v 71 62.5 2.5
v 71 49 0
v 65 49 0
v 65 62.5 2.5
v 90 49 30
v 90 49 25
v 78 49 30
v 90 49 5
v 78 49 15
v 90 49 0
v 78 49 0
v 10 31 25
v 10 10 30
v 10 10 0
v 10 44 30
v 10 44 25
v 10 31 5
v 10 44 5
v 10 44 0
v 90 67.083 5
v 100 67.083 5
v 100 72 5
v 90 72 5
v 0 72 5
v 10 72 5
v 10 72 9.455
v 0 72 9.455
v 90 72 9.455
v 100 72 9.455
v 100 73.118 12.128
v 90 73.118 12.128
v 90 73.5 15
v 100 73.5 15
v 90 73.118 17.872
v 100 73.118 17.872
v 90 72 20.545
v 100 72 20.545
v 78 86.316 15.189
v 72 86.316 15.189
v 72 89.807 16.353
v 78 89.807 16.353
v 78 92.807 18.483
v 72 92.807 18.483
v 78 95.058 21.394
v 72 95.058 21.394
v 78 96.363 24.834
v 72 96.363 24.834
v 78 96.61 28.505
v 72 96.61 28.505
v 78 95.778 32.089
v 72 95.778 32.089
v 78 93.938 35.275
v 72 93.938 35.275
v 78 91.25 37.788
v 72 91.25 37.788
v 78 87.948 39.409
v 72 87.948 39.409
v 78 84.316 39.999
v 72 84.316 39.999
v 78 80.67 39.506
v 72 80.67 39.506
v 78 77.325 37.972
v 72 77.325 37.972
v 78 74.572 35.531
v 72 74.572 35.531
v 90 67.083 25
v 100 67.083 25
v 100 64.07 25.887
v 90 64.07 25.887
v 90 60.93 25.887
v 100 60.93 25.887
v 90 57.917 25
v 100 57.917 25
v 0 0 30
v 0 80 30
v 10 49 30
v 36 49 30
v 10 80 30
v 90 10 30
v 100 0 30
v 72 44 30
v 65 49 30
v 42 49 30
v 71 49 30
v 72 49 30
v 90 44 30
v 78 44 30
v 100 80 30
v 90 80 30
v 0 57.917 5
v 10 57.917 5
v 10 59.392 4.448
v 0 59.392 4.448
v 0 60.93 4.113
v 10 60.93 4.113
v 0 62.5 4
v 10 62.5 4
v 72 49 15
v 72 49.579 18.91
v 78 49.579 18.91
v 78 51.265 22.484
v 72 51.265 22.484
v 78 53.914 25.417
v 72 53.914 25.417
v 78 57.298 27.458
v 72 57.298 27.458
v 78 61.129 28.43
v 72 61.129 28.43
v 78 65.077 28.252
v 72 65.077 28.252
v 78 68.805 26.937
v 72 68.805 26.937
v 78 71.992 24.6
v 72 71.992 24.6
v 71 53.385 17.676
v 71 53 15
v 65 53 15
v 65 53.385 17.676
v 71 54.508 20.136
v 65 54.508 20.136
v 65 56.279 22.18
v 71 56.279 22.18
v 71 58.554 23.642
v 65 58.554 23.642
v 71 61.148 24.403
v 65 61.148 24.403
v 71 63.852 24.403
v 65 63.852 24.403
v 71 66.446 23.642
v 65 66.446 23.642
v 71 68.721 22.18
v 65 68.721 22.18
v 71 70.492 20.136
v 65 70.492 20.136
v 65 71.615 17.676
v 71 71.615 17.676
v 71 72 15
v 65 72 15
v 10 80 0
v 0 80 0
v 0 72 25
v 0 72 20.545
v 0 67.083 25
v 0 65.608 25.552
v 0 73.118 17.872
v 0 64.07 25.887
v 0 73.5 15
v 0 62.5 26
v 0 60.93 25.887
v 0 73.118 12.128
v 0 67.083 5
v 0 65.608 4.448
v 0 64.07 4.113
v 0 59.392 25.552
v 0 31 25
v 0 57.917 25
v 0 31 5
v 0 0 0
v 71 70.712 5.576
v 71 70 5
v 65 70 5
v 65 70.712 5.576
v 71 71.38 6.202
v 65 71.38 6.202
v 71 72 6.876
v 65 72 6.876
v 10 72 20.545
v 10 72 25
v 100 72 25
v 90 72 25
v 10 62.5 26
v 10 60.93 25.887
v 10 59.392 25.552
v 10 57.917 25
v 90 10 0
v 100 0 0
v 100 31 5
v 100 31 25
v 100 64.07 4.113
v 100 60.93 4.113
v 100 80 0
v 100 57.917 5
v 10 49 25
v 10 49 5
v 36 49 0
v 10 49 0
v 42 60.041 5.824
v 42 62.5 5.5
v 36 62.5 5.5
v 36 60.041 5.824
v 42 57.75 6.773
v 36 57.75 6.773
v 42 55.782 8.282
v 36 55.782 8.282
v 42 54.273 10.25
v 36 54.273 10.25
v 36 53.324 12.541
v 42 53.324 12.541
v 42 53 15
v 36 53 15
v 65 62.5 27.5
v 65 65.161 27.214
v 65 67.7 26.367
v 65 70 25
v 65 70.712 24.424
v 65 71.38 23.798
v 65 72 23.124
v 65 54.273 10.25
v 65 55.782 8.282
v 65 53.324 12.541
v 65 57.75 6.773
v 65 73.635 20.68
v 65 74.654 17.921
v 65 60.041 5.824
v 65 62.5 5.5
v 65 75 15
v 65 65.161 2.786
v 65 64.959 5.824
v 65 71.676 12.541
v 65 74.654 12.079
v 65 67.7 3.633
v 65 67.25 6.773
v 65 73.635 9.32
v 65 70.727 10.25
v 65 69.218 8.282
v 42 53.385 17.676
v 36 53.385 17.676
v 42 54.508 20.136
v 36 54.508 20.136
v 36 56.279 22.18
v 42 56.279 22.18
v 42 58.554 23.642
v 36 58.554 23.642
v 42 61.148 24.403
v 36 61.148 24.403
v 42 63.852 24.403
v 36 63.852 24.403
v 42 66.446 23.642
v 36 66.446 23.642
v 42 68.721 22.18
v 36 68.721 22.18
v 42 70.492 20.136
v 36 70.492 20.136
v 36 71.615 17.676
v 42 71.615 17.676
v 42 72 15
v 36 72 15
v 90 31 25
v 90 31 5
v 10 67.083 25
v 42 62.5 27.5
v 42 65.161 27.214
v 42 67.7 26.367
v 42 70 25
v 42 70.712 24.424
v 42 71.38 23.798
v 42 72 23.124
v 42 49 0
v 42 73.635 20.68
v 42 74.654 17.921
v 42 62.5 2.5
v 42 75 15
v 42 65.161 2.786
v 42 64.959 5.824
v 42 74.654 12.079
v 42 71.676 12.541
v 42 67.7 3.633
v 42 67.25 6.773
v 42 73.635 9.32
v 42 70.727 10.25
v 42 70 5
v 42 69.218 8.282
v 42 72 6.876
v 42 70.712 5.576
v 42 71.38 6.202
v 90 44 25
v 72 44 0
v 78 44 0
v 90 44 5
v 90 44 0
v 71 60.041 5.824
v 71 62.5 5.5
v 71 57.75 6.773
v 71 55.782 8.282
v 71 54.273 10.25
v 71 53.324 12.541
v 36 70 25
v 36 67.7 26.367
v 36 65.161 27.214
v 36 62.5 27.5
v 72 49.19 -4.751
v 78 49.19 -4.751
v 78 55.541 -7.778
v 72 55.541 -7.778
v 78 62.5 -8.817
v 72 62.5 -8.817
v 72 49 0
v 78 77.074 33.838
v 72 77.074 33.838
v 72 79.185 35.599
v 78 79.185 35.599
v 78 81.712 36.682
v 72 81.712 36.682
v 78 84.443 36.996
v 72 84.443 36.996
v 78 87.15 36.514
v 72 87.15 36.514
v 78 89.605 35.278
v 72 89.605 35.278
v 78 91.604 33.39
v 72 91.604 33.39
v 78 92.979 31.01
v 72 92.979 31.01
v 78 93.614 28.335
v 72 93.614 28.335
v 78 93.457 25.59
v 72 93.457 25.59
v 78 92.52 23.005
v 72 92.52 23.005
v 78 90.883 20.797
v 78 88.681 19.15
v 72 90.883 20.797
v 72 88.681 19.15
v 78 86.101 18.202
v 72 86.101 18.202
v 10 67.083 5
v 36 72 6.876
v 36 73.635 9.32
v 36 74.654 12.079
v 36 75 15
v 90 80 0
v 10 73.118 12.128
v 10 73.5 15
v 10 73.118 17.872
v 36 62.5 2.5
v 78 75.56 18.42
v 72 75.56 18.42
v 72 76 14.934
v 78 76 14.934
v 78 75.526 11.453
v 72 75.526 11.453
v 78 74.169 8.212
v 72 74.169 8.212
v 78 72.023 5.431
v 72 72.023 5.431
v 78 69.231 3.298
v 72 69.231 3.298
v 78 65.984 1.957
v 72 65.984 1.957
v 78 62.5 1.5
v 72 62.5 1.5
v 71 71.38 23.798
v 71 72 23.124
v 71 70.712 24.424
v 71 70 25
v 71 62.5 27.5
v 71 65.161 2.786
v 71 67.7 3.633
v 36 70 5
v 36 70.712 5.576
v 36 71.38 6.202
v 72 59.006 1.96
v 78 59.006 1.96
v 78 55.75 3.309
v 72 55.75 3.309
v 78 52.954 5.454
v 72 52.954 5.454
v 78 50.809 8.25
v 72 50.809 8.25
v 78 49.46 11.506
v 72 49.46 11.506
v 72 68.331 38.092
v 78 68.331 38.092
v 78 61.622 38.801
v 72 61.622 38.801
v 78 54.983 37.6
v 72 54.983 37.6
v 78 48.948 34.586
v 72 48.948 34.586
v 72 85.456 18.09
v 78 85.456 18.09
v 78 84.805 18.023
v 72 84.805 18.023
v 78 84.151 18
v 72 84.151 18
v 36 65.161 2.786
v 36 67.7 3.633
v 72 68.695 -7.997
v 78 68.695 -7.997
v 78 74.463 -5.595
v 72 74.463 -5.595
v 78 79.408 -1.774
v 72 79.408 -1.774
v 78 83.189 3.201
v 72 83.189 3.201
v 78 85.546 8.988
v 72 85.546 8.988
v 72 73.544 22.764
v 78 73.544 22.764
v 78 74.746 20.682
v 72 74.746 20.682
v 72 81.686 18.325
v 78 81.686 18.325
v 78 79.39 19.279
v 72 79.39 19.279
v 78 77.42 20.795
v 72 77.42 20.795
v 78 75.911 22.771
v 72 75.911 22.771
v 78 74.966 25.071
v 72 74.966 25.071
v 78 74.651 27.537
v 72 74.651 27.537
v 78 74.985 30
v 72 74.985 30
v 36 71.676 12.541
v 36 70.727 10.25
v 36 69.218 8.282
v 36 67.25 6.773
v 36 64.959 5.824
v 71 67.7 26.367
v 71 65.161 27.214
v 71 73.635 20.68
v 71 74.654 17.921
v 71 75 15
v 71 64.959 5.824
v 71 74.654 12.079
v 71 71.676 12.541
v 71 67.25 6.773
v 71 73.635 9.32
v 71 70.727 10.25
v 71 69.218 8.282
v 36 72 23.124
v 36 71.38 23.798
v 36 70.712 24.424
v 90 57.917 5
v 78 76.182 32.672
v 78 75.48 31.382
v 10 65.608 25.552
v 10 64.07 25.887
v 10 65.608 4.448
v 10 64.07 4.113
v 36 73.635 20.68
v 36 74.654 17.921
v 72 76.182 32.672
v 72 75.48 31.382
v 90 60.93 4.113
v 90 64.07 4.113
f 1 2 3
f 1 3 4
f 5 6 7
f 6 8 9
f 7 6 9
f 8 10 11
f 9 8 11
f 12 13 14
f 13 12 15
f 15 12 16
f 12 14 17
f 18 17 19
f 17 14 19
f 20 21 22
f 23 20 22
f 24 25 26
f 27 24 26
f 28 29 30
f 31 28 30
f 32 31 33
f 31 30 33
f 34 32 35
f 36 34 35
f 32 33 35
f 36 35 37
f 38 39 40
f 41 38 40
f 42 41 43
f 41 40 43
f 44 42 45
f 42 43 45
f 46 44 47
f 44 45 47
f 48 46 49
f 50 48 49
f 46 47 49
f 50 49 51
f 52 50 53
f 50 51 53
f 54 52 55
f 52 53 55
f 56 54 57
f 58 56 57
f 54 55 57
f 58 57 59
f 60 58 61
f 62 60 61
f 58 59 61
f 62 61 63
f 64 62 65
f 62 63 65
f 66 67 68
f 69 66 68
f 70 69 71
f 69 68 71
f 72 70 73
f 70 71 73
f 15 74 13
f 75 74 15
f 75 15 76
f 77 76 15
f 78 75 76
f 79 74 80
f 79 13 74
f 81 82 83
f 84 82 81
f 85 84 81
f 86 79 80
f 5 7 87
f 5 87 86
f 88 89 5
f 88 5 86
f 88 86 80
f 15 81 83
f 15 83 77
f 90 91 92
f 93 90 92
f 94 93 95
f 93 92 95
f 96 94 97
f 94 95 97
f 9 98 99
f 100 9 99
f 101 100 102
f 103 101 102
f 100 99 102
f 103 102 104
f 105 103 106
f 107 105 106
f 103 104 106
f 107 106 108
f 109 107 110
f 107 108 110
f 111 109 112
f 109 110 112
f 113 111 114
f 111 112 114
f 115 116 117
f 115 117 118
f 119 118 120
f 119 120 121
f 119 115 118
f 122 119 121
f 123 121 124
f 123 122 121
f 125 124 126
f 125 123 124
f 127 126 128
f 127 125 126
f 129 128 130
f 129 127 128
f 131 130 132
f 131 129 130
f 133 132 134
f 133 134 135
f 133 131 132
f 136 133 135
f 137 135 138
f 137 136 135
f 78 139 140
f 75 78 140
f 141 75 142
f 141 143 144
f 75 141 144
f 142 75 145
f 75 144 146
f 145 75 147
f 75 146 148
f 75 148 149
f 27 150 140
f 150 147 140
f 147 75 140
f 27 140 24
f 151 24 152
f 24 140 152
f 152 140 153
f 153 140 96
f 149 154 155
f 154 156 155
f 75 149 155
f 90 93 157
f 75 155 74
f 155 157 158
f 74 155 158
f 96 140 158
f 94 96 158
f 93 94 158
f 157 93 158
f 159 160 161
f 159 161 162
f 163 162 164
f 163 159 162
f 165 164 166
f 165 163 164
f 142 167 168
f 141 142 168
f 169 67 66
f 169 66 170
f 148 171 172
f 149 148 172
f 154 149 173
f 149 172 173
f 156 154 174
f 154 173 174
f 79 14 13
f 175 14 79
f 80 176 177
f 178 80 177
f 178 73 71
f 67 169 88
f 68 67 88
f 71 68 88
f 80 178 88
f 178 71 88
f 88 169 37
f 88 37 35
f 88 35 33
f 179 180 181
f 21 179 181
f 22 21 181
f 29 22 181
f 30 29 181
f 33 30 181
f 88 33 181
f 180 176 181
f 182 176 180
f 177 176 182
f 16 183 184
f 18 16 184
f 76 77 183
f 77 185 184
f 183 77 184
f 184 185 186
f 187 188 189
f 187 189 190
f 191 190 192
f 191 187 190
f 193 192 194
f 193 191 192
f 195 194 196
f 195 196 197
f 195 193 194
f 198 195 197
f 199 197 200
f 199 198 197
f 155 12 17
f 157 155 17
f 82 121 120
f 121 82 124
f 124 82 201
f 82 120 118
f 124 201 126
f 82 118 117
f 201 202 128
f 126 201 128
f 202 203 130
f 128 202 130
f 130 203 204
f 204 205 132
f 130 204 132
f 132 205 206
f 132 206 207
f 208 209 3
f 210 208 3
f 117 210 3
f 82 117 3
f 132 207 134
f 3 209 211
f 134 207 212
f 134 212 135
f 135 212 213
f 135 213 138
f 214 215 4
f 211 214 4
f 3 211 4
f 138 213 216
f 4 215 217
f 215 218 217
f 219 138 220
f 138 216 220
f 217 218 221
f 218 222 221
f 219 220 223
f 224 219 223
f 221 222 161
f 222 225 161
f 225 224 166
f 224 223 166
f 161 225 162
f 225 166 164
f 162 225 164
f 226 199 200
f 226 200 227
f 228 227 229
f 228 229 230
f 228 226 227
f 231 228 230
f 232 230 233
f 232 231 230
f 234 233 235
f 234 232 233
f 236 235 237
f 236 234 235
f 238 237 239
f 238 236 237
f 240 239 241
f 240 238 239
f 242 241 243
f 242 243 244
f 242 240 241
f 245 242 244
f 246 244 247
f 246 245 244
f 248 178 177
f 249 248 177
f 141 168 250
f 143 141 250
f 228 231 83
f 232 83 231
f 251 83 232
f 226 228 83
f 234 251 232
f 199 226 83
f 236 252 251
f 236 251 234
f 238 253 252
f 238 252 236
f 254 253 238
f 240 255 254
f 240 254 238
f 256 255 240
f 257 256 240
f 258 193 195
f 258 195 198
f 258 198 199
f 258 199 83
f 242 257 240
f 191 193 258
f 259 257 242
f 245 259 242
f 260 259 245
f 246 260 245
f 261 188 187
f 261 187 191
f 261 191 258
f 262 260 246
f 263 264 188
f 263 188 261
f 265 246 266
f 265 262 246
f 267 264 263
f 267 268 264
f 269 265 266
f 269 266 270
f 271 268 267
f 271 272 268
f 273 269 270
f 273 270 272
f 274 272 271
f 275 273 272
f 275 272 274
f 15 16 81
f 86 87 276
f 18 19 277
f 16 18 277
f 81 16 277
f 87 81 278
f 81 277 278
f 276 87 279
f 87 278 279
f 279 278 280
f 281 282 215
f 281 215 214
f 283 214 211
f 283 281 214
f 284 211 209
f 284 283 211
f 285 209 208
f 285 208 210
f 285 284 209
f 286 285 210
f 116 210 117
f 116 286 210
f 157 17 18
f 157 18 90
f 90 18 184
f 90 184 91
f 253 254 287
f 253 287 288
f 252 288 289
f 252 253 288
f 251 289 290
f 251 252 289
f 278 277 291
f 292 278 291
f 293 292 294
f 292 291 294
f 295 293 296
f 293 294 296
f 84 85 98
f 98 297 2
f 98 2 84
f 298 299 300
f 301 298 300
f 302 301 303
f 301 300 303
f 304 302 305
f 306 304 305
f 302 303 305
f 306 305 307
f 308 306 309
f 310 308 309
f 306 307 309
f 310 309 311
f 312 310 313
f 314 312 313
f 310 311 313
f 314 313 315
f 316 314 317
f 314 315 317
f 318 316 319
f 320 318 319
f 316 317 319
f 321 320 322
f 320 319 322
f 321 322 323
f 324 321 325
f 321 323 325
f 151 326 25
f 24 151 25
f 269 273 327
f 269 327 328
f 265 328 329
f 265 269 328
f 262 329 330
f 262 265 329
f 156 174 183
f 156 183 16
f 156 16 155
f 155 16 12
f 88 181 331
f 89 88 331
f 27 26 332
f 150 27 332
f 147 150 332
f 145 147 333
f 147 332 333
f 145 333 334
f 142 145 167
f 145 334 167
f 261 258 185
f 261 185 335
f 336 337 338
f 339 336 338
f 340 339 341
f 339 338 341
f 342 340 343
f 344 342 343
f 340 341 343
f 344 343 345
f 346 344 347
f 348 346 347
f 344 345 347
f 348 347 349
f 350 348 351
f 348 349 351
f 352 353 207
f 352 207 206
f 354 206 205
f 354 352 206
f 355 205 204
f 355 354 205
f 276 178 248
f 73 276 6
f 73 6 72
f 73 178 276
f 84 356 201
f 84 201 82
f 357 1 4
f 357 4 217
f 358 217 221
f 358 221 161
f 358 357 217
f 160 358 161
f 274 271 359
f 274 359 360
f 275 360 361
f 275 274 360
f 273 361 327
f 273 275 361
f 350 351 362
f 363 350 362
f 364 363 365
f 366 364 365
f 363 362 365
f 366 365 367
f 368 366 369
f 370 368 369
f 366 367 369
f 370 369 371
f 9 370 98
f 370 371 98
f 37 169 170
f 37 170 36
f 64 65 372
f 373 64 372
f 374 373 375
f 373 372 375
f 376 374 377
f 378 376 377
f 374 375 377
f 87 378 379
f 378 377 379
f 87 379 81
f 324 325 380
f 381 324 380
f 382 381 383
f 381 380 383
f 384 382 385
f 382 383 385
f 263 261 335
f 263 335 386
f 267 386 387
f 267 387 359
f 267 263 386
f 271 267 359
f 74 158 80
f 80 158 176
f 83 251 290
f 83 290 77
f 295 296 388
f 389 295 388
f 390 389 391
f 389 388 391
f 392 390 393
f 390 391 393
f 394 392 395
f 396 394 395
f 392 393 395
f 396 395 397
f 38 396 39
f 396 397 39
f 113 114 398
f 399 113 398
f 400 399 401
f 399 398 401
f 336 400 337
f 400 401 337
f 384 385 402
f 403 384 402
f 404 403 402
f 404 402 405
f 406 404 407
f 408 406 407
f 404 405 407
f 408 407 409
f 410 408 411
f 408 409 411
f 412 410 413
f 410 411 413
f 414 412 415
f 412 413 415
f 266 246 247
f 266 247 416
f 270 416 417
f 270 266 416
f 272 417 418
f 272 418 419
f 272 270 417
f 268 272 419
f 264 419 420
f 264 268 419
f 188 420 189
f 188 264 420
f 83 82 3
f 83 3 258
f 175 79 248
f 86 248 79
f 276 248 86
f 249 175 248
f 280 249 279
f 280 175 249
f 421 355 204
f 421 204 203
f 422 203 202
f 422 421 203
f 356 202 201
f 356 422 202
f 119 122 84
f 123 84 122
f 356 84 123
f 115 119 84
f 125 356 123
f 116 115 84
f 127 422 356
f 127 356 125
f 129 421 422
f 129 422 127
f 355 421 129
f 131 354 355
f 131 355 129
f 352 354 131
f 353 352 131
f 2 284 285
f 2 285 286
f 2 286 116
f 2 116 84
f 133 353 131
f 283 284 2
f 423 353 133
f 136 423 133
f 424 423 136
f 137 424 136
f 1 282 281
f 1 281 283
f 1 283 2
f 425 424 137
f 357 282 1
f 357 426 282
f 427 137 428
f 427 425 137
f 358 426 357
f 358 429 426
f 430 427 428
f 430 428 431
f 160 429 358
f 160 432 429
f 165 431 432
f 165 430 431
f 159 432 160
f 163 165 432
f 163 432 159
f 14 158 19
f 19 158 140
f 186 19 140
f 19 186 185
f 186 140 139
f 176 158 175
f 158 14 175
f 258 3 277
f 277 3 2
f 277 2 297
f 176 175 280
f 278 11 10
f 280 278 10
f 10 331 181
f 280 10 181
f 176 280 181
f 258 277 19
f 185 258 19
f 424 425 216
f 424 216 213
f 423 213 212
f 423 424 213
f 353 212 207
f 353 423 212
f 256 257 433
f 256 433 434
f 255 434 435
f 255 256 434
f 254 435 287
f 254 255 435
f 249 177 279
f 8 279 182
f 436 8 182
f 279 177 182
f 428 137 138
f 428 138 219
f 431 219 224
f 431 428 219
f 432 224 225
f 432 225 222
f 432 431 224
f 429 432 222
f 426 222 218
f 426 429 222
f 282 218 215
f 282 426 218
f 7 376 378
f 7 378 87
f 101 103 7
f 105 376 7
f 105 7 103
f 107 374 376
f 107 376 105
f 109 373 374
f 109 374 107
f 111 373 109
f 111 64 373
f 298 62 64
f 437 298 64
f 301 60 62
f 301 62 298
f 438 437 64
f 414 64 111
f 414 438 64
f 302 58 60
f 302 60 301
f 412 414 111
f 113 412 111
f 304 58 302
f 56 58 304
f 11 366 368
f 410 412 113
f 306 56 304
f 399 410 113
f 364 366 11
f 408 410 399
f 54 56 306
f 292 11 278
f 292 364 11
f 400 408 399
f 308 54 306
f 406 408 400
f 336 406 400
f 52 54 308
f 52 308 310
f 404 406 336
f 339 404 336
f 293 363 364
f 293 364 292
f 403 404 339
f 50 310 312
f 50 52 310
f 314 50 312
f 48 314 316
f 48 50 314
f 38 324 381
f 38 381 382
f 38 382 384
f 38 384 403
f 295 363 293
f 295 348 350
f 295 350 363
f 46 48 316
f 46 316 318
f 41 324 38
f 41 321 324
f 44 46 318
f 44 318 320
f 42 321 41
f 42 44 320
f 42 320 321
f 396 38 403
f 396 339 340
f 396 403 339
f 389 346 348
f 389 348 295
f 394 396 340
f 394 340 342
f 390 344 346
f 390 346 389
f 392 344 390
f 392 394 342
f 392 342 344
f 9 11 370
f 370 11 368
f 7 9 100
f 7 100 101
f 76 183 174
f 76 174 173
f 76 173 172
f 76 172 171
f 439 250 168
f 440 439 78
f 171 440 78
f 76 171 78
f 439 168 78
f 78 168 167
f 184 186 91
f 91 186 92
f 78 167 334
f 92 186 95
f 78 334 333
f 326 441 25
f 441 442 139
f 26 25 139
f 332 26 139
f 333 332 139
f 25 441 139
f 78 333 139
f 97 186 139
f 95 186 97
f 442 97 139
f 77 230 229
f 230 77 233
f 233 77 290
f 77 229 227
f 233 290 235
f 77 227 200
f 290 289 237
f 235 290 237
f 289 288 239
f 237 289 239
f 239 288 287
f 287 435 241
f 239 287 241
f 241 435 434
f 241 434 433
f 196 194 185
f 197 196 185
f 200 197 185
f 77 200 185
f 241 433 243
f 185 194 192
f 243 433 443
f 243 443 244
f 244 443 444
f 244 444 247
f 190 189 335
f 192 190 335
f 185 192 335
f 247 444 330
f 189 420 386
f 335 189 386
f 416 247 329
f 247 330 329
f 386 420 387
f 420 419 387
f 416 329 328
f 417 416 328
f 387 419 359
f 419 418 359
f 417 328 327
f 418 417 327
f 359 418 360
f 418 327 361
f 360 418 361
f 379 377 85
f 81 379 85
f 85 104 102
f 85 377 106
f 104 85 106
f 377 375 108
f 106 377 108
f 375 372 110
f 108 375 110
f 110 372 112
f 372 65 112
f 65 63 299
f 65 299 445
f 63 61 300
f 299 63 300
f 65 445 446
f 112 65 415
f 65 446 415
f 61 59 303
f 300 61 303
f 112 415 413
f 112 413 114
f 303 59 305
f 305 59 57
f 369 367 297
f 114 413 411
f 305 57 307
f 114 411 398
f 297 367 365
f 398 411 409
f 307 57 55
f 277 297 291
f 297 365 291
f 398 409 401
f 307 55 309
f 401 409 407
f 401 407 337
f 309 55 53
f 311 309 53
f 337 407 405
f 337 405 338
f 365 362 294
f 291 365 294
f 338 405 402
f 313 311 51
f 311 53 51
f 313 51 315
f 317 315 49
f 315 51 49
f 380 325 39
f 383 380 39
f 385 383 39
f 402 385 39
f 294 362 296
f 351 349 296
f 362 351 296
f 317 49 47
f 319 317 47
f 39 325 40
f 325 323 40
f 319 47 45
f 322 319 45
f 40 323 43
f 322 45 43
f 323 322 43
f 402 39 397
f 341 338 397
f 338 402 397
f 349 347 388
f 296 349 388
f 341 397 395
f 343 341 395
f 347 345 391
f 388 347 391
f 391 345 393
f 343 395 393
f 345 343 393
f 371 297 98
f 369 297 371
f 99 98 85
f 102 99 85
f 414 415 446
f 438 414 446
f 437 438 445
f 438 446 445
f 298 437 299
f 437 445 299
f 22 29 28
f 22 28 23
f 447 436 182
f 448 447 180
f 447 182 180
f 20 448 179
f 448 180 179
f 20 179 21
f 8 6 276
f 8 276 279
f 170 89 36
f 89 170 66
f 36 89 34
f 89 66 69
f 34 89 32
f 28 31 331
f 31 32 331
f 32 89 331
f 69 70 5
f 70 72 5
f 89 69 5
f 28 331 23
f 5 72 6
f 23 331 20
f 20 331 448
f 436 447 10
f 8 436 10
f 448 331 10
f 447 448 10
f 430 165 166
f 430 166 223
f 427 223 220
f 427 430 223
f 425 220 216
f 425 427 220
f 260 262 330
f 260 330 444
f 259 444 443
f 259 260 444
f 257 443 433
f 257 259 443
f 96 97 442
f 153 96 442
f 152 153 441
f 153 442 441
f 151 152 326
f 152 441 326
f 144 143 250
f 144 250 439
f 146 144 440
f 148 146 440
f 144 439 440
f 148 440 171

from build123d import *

# Parameters (mm, degrees)
CROQUIS1_W              = 80
CROQUIS1_H              = 34
SALIENTE_EXTRUIR1_DEPTH = 30
CROQUIS2_W              = 20
CROQUIS2_H              = 18
CORTAR_EXTRUIR1_DEPTH   = 30
CORTAR_EXTRUIR2_START   = 100
CROQUIS2_4_R            = 11
CROQUIS2_4_W            = 20
CROQUIS2_4_H            = 41
CORTAR_EXTRUIR2_DEPTH   = 20
SALIENTE_EXTRUIR2_START = 32
SALIENTE_EXTRUIR2_DEPTH = 6
SALIENTE_EXTRUIR3_START = 61
SALIENTE_EXTRUIR3_DEPTH = 6
SALIENTE_EXTRUIR4_START = -28
SALIENTE_EXTRUIR4_DEPTH = 6


# Read off the part's stored shape, not the designer's step: Saliente-Extruir4
with BuildPart() as part:
    # Croquis1 → Saliente-Extruir1 (new body)
    with BuildSketch(Plane.XY):
        Polygon((0, 80), (0, 0), (100, 0), (100, 80), (90, 80), (90, 49), (10, 49), (10, 80), align=None)
        with Locations((50, 27)):
            Rectangle(CROQUIS1_W, CROQUIS1_H, mode=Mode.SUBTRACT)
    extrude(amount=SALIENTE_EXTRUIR1_DEPTH)

    # Croquis2 → Cortar-Extruir1 (cut)
    with BuildSketch(Plane(origin=(10, 0, 0), x_dir=(0, 0, -1), z_dir=(1, 0, 0))):
        with BuildLine():
            Line((-20.545268253, 72), (-25, 72))
            Line((-25, 72), (-25, 67.082575695))
            ThreePointArc((-25, 67.082575695), (-23.152245501, 69.885180654), (-20.545268253, 72))
        make_face()
        with BuildLine():
            ThreePointArc((-9.454731747, 72), (-15, 73.5), (-20.545268253, 72))
            Line((-20.545268253, 72), (-9.454731747, 72))
        make_face()
        with BuildLine():
            Line((-5, 72), (-9.454731747, 72))
            ThreePointArc((-9.454731747, 72), (-6.847754499, 69.885180654), (-5, 67.082575695))
            Line((-5, 67.082575695), (-5, 72))
        make_face()
        with BuildLine():
            ThreePointArc((-4, 62.5), (-4.25290737, 64.84520788), (-5, 67.082575695))
            Line((-5, 67.082575695), (-5, 62.5))
            Line((-5, 62.5), (-4, 62.5))
        make_face()
        with BuildLine():
            Line((-4, 62.5), (-5, 62.5))
            Line((-5, 62.5), (-5, 57.917424305))
            ThreePointArc((-5, 57.917424305), (-4.25290737, 60.15479212), (-4, 62.5))
        make_face()
        with BuildLine():
            Line((-25, 62.5), (-25, 67.082575695))
            ThreePointArc((-25, 67.082575695), (-25.74709263, 64.84520788), (-26, 62.5))
            Line((-26, 62.5), (-25, 62.5))
        make_face()
        with BuildLine():
            Line((-25, 57.917424305), (-25, 62.5))
            Line((-25, 62.5), (-26, 62.5))
            ThreePointArc((-26, 62.5), (-25.74709263, 60.15479212), (-25, 57.917424305))
        make_face()
        with BuildLine():
            Line((-9.454731747, 72), (-20.545268253, 72))
            ThreePointArc((-20.545268253, 72), (-23.152245501, 69.885180654), (-25, 67.082575695))
            Line((-25, 67.082575695), (-25, 62.5))
            Line((-25, 62.5), (-5, 62.5))
            Line((-5, 62.5), (-5, 67.082575695))
            ThreePointArc((-5, 67.082575695), (-6.847754499, 69.885180654), (-9.454731747, 72))
        make_face()
        with BuildLine():
            Line((-5, 62.5), (-25, 62.5))
            Line((-25, 62.5), (-25, 57.917424305))
            ThreePointArc((-25, 57.917424305), (-15, 51.5), (-5, 57.917424305))
            Line((-5, 57.917424305), (-5, 62.5))
        make_face()
        with BuildLine():
            ThreePointArc((-5, 57.917424305), (-15, 51.5), (-25, 57.917424305))
            Line((-25, 57.917424305), (-25, 49))
            Line((-25, 49), (-5, 49))
            Line((-5, 49), (-5, 57.917424305))
        make_face()
        with Locations((-15, 40)):
            Rectangle(CROQUIS2_W, CROQUIS2_H)
    extrude(amount=-CORTAR_EXTRUIR1_DEPTH, mode=Mode.SUBTRACT)

    # Croquis2<4> → Cortar-Extruir2 (cut)
    with BuildSketch(Plane(origin=(10, 0, 0), x_dir=(0, 0, -1), z_dir=(1, 0, 0)).offset(CORTAR_EXTRUIR2_START)):
        with Locations((-15, 62.5)):
            Circle(CROQUIS2_4_R)
        with Locations((-15, 51.5)):
            Rectangle(CROQUIS2_4_W, CROQUIS2_4_H)
    extrude(amount=-CORTAR_EXTRUIR2_DEPTH, mode=Mode.SUBTRACT)

    # Croquis3 → Saliente-Extruir2 (add)
    with BuildSketch(Plane(origin=(10, 0, 0), x_dir=(0, 0, -1), z_dir=(1, 0, 0)).offset(SALIENTE_EXTRUIR2_START)):
        with BuildLine():
            Line((-15, 49), (-15, 50))
            ThreePointArc((-15, 50), (-20.590169944, 51.319660113), (-25, 55))
            Line((-25, 55), (-25, 49))
            Line((-25, 49), (-15, 49))
        make_face()
        with BuildLine():
            ThreePointArc((-5, 55), (-9.409830056, 51.319660113), (-15, 50))
            Line((-15, 50), (-15, 49))
            Line((-15, 49), (-5, 49))
            Line((-5, 49), (-5, 55))
        make_face()
        with BuildLine():
            Line((0, 49), (-2.5, 62.5))
            ThreePointArc((-2.5, 62.5), (-3.141458774, 58.547152925), (-5, 55))
            Line((-5, 55), (-5, 49))
            Line((-5, 49), (0, 49))
        make_face()
        with BuildLine():
            ThreePointArc((-25, 55), (-26.858541226, 58.547152925), (-27.5, 62.5))
            Line((-27.5, 62.5), (-30, 49))
            Line((-30, 49), (-25, 49))
            Line((-25, 49), (-25, 55))
        make_face()
        with BuildLine():
            Line((-15, 72), (-15, 73.5))
            ThreePointArc((-15, 73.5), (-17.872281323, 73.118380291), (-20.545268253, 72))
            Line((-20.545268253, 72), (-23.124038405, 72))
            ThreePointArc((-23.124038405, 72), (-24.117027587, 71.051596809), (-25, 70))
            Line((-25, 70), (-25, 67.082575695))
            ThreePointArc((-25, 67.082575695), (-26, 62.5), (-25, 57.917424305))
            Line((-25, 57.917424305), (-25, 55))
            ThreePointArc((-25, 55), (-20.590169944, 51.319660113), (-15, 50))
            Line((-15, 50), (-15, 53))
            ThreePointArc((-15, 53), (-24.5, 62.5), (-15, 72))
        make_face()
        with BuildLine():
            Line((-25, 67.082575695), (-25, 70))
            ThreePointArc((-25, 70), (-26.858541226, 66.452847075), (-27.5, 62.5))
            ThreePointArc((-27.5, 62.5), (-26.858541226, 58.547152925), (-25, 55))
            Line((-25, 55), (-25, 57.917424305))
            ThreePointArc((-25, 57.917424305), (-26, 62.5), (-25, 67.082575695))
        make_face()
        with BuildLine():
            ThreePointArc((-9.454731747, 72), (-12.127718677, 73.118380291), (-15, 73.5))
            Line((-15, 73.5), (-15, 72))
            ThreePointArc((-15, 72), (-8.282485579, 69.217514421), (-5.5, 62.5))
            ThreePointArc((-5.5, 62.5), (-8.282485579, 55.782485579), (-15, 53))
            Line((-15, 53), (-15, 50))
            ThreePointArc((-15, 50), (-9.409830056, 51.319660113), (-5, 55))
            Line((-5, 55), (-5, 57.917424305))
            ThreePointArc((-5, 57.917424305), (-4, 62.5), (-5, 67.082575695))
            Line((-5, 67.082575695), (-5, 70))
            ThreePointArc((-5, 70), (-5.882972413, 71.051596809), (-6.875961595, 72))
            Line((-6.875961595, 72), (-9.454731747, 72))
        make_face()
        with BuildLine():
            ThreePointArc((-2.5, 62.5), (-3.141458774, 66.452847075), (-5, 70))
            Line((-5, 70), (-5, 67.082575695))
            ThreePointArc((-5, 67.082575695), (-4, 62.5), (-5, 57.917424305))
            Line((-5, 57.917424305), (-5, 55))
            ThreePointArc((-5, 55), (-3.141458774, 58.547152925), (-2.5, 62.5))
        make_face()
        with BuildLine():
            ThreePointArc((-6.875961595, 72), (-10.669872981, 74.2260394), (-15, 75))
            Line((-15, 75), (-15, 73.5))
            ThreePointArc((-15, 73.5), (-12.127718677, 73.118380291), (-9.454731747, 72))
            Line((-9.454731747, 72), (-6.875961595, 72))
        make_face()
        with BuildLine():
            Line((-15, 73.5), (-15, 75))
            ThreePointArc((-15, 75), (-19.330127019, 74.2260394), (-23.124038405, 72))
            Line((-23.124038405, 72), (-20.545268253, 72))
            ThreePointArc((-20.545268253, 72), (-17.872281323, 73.118380291), (-15, 73.5))
        make_face()
    extrude(amount=-SALIENTE_EXTRUIR2_DEPTH)

    # Croquis3<3> → Saliente-Extruir3 (add)
    with BuildSketch(Plane(origin=(10, 0, 0), x_dir=(0, 0, -1), z_dir=(1, 0, 0)).offset(SALIENTE_EXTRUIR3_START)):
        with BuildLine():
            Line((0, 49), (-2.5, 62.5))
            ThreePointArc((-2.5, 62.5), (-3.141458774, 58.547152925), (-5, 55))
            Line((-5, 55), (-5, 49))
            Line((-5, 49), (0, 49))
        make_face()
        with BuildLine():
            ThreePointArc((-5, 55), (-9.409830056, 51.319660113), (-15, 50))
            Line((-15, 50), (-15, 49))
            Line((-15, 49), (-5, 49))
            Line((-5, 49), (-5, 55))
        make_face()
        with BuildLine():
            ThreePointArc((-2.5, 62.5), (-3.141458774, 66.452847075), (-5, 70))
            Line((-5, 70), (-5, 67.082575695))
            ThreePointArc((-5, 67.082575695), (-4, 62.5), (-5, 57.917424305))
            Line((-5, 57.917424305), (-5, 55))
            ThreePointArc((-5, 55), (-3.141458774, 58.547152925), (-2.5, 62.5))
        make_face()
        with BuildLine():
            ThreePointArc((-9.454731747, 72), (-12.127718677, 73.118380291), (-15, 73.5))
            Line((-15, 73.5), (-15, 72))
            ThreePointArc((-15, 72), (-8.282485579, 69.217514421), (-5.5, 62.5))
            ThreePointArc((-5.5, 62.5), (-8.282485579, 55.782485579), (-15, 53))
            Line((-15, 53), (-15, 50))
            ThreePointArc((-15, 50), (-9.409830056, 51.319660113), (-5, 55))
            Line((-5, 55), (-5, 57.917424305))
            ThreePointArc((-5, 57.917424305), (-4, 62.5), (-5, 67.082575695))
            Line((-5, 67.082575695), (-5, 70))
            ThreePointArc((-5, 70), (-5.882972413, 71.051596809), (-6.875961595, 72))
            Line((-6.875961595, 72), (-9.454731747, 72))
        make_face()
        with BuildLine():
            Line((-15, 72), (-15, 73.5))
            ThreePointArc((-15, 73.5), (-17.872281323, 73.118380291), (-20.545268253, 72))
            Line((-20.545268253, 72), (-23.124038405, 72))
            ThreePointArc((-23.124038405, 72), (-24.117027587, 71.051596809), (-25, 70))
            Line((-25, 70), (-25, 67.082575695))
            ThreePointArc((-25, 67.082575695), (-26, 62.5), (-25, 57.917424305))
            Line((-25, 57.917424305), (-25, 55))
            ThreePointArc((-25, 55), (-20.590169944, 51.319660113), (-15, 50))
            Line((-15, 50), (-15, 53))
            ThreePointArc((-15, 53), (-24.5, 62.5), (-15, 72))
        make_face()
        with BuildLine():
            Line((-15, 49), (-15, 50))
            ThreePointArc((-15, 50), (-20.590169944, 51.319660113), (-25, 55))
            Line((-25, 55), (-25, 49))
            Line((-25, 49), (-15, 49))
        make_face()
        with BuildLine():
            ThreePointArc((-25, 55), (-26.858541226, 58.547152925), (-27.5, 62.5))
            Line((-27.5, 62.5), (-30, 49))
            Line((-30, 49), (-25, 49))
            Line((-25, 49), (-25, 55))
        make_face()
        with BuildLine():
            Line((-25, 67.082575695), (-25, 70))
            ThreePointArc((-25, 70), (-26.858541226, 66.452847075), (-27.5, 62.5))
            ThreePointArc((-27.5, 62.5), (-26.858541226, 58.547152925), (-25, 55))
            Line((-25, 55), (-25, 57.917424305))
            ThreePointArc((-25, 57.917424305), (-26, 62.5), (-25, 67.082575695))
        make_face()
        with BuildLine():
            Line((-15, 73.5), (-15, 75))
            ThreePointArc((-15, 75), (-19.330127019, 74.2260394), (-23.124038405, 72))
            Line((-23.124038405, 72), (-20.545268253, 72))
            ThreePointArc((-20.545268253, 72), (-17.872281323, 73.118380291), (-15, 73.5))
        make_face()
        with BuildLine():
            ThreePointArc((-6.875961595, 72), (-10.669872981, 74.2260394), (-15, 75))
            Line((-15, 75), (-15, 73.5))
            ThreePointArc((-15, 73.5), (-12.127718677, 73.118380291), (-9.454731747, 72))
            Line((-9.454731747, 72), (-6.875961595, 72))
        make_face()
    extrude(amount=-SALIENTE_EXTRUIR3_DEPTH)

    # Saliente-Extruir4 outline → Saliente-Extruir4 (add)
    with BuildSketch(Plane(origin=(100, 0, 0), x_dir=(0, 0, -1), z_dir=(1, 0, 0)).offset(SALIENTE_EXTRUIR4_START)):
        with BuildLine():
            Line((0, 49), (0, 44))
            ThreePointArc((0, 44), (6.500060011, 52.253175148), (8.817010728, 62.5))
            ThreePointArc((8.817010728, 62.5), (1.774205668, 79.407868707), (-15.189026595, 86.3162606))
            ThreePointArc((-15.189026595, 86.3162606), (-15.047346316, 85.237564817), (-15, 84.150635095))
            ThreePointArc((-15, 84.150635095), (-15.886469538, 79.527226156), (-18.420145635, 75.559579007))
            ThreePointArc((-18.420145635, 75.559579007), (-6.751423337, 73.186953871), (-1.5, 62.5))
            ThreePointArc((-1.5, 62.5), (-5.454058454, 52.954058454), (-15, 49))
            Line((-15, 49), (0, 49))
        make_face()
        with BuildLine():
            ThreePointArc((-35.530973405, 74.571832133), (-38.436547266, 58.259923086), (-30, 44))
            Line((-30, 44), (-30, 49))
            Line((-30, 49), (-30, 71.903186381))
            ThreePointArc((-30, 71.903186381), (-32.931921184, 72.892561003), (-35.530973405, 74.571832133))
        make_face()
        with BuildLine():
            ThreePointArc((-33.837691475, 77.073653622), (-34.724039173, 75.849617174), (-35.530973405, 74.571832133))
            ThreePointArc((-35.530973405, 74.571832133), (-32.931921184, 72.892561003), (-30, 71.903186381))
            Line((-30, 71.903186381), (-30, 74.985483705))
            ThreePointArc((-30, 74.985483705), (-32.040518809, 75.805954816), (-33.837691475, 77.073653622))
        make_face()
        with BuildLine():
            ThreePointArc((-15.189026595, 86.3162606), (-33.75, 94.975952642), (-35.530973405, 74.571832133))
            ThreePointArc((-35.530973405, 74.571832133), (-34.724039173, 75.849617174), (-33.837691475, 77.073653622))
            ThreePointArc((-33.837691475, 77.073653622), (-32.25, 92.377876431), (-18.202308525, 86.100746177))
            ThreePointArc((-18.202308525, 86.100746177), (-16.699088017, 86.256327576), (-15.189026595, 86.3162606))
        make_face()
        with BuildLine():
            Line((-30, 71.903186381), (-30, 49))
            Line((-30, 49), (-15, 49))
            ThreePointArc((-15, 49), (-27.457693483, 57.298473967), (-24.599854366, 71.991722508))
            ThreePointArc((-24.599854366, 71.991722508), (-27.295088327, 71.652314759), (-30, 71.903186381))
        make_face()
        with BuildLine():
            ThreePointArc((-15, 84.150635095), (-15.047346316, 85.237564817), (-15.189026595, 86.3162606))
            ThreePointArc((-15.189026595, 86.3162606), (-16.699088017, 86.256327576), (-18.202308525, 86.100746177))
            ThreePointArc((-18.202308525, 86.100746177), (-18.050712487, 85.130923569), (-18, 84.150635095))
            ThreePointArc((-18, 84.150635095), (-21.733718703, 76.600800659), (-30, 74.985483705))
            Line((-30, 74.985483705), (-30, 71.903186381))
            ThreePointArc((-30, 71.903186381), (-27.295088327, 71.652314759), (-24.599854366, 71.991722508))
            ThreePointArc((-24.599854366, 71.991722508), (-21.75, 74.191342951), (-18.420145635, 75.559579007))
            ThreePointArc((-18.420145635, 75.559579007), (-15.886469538, 79.527226156), (-15, 84.150635095))
        make_face()
    extrude(amount=SALIENTE_EXTRUIR4_DEPTH)


solid = part.part
